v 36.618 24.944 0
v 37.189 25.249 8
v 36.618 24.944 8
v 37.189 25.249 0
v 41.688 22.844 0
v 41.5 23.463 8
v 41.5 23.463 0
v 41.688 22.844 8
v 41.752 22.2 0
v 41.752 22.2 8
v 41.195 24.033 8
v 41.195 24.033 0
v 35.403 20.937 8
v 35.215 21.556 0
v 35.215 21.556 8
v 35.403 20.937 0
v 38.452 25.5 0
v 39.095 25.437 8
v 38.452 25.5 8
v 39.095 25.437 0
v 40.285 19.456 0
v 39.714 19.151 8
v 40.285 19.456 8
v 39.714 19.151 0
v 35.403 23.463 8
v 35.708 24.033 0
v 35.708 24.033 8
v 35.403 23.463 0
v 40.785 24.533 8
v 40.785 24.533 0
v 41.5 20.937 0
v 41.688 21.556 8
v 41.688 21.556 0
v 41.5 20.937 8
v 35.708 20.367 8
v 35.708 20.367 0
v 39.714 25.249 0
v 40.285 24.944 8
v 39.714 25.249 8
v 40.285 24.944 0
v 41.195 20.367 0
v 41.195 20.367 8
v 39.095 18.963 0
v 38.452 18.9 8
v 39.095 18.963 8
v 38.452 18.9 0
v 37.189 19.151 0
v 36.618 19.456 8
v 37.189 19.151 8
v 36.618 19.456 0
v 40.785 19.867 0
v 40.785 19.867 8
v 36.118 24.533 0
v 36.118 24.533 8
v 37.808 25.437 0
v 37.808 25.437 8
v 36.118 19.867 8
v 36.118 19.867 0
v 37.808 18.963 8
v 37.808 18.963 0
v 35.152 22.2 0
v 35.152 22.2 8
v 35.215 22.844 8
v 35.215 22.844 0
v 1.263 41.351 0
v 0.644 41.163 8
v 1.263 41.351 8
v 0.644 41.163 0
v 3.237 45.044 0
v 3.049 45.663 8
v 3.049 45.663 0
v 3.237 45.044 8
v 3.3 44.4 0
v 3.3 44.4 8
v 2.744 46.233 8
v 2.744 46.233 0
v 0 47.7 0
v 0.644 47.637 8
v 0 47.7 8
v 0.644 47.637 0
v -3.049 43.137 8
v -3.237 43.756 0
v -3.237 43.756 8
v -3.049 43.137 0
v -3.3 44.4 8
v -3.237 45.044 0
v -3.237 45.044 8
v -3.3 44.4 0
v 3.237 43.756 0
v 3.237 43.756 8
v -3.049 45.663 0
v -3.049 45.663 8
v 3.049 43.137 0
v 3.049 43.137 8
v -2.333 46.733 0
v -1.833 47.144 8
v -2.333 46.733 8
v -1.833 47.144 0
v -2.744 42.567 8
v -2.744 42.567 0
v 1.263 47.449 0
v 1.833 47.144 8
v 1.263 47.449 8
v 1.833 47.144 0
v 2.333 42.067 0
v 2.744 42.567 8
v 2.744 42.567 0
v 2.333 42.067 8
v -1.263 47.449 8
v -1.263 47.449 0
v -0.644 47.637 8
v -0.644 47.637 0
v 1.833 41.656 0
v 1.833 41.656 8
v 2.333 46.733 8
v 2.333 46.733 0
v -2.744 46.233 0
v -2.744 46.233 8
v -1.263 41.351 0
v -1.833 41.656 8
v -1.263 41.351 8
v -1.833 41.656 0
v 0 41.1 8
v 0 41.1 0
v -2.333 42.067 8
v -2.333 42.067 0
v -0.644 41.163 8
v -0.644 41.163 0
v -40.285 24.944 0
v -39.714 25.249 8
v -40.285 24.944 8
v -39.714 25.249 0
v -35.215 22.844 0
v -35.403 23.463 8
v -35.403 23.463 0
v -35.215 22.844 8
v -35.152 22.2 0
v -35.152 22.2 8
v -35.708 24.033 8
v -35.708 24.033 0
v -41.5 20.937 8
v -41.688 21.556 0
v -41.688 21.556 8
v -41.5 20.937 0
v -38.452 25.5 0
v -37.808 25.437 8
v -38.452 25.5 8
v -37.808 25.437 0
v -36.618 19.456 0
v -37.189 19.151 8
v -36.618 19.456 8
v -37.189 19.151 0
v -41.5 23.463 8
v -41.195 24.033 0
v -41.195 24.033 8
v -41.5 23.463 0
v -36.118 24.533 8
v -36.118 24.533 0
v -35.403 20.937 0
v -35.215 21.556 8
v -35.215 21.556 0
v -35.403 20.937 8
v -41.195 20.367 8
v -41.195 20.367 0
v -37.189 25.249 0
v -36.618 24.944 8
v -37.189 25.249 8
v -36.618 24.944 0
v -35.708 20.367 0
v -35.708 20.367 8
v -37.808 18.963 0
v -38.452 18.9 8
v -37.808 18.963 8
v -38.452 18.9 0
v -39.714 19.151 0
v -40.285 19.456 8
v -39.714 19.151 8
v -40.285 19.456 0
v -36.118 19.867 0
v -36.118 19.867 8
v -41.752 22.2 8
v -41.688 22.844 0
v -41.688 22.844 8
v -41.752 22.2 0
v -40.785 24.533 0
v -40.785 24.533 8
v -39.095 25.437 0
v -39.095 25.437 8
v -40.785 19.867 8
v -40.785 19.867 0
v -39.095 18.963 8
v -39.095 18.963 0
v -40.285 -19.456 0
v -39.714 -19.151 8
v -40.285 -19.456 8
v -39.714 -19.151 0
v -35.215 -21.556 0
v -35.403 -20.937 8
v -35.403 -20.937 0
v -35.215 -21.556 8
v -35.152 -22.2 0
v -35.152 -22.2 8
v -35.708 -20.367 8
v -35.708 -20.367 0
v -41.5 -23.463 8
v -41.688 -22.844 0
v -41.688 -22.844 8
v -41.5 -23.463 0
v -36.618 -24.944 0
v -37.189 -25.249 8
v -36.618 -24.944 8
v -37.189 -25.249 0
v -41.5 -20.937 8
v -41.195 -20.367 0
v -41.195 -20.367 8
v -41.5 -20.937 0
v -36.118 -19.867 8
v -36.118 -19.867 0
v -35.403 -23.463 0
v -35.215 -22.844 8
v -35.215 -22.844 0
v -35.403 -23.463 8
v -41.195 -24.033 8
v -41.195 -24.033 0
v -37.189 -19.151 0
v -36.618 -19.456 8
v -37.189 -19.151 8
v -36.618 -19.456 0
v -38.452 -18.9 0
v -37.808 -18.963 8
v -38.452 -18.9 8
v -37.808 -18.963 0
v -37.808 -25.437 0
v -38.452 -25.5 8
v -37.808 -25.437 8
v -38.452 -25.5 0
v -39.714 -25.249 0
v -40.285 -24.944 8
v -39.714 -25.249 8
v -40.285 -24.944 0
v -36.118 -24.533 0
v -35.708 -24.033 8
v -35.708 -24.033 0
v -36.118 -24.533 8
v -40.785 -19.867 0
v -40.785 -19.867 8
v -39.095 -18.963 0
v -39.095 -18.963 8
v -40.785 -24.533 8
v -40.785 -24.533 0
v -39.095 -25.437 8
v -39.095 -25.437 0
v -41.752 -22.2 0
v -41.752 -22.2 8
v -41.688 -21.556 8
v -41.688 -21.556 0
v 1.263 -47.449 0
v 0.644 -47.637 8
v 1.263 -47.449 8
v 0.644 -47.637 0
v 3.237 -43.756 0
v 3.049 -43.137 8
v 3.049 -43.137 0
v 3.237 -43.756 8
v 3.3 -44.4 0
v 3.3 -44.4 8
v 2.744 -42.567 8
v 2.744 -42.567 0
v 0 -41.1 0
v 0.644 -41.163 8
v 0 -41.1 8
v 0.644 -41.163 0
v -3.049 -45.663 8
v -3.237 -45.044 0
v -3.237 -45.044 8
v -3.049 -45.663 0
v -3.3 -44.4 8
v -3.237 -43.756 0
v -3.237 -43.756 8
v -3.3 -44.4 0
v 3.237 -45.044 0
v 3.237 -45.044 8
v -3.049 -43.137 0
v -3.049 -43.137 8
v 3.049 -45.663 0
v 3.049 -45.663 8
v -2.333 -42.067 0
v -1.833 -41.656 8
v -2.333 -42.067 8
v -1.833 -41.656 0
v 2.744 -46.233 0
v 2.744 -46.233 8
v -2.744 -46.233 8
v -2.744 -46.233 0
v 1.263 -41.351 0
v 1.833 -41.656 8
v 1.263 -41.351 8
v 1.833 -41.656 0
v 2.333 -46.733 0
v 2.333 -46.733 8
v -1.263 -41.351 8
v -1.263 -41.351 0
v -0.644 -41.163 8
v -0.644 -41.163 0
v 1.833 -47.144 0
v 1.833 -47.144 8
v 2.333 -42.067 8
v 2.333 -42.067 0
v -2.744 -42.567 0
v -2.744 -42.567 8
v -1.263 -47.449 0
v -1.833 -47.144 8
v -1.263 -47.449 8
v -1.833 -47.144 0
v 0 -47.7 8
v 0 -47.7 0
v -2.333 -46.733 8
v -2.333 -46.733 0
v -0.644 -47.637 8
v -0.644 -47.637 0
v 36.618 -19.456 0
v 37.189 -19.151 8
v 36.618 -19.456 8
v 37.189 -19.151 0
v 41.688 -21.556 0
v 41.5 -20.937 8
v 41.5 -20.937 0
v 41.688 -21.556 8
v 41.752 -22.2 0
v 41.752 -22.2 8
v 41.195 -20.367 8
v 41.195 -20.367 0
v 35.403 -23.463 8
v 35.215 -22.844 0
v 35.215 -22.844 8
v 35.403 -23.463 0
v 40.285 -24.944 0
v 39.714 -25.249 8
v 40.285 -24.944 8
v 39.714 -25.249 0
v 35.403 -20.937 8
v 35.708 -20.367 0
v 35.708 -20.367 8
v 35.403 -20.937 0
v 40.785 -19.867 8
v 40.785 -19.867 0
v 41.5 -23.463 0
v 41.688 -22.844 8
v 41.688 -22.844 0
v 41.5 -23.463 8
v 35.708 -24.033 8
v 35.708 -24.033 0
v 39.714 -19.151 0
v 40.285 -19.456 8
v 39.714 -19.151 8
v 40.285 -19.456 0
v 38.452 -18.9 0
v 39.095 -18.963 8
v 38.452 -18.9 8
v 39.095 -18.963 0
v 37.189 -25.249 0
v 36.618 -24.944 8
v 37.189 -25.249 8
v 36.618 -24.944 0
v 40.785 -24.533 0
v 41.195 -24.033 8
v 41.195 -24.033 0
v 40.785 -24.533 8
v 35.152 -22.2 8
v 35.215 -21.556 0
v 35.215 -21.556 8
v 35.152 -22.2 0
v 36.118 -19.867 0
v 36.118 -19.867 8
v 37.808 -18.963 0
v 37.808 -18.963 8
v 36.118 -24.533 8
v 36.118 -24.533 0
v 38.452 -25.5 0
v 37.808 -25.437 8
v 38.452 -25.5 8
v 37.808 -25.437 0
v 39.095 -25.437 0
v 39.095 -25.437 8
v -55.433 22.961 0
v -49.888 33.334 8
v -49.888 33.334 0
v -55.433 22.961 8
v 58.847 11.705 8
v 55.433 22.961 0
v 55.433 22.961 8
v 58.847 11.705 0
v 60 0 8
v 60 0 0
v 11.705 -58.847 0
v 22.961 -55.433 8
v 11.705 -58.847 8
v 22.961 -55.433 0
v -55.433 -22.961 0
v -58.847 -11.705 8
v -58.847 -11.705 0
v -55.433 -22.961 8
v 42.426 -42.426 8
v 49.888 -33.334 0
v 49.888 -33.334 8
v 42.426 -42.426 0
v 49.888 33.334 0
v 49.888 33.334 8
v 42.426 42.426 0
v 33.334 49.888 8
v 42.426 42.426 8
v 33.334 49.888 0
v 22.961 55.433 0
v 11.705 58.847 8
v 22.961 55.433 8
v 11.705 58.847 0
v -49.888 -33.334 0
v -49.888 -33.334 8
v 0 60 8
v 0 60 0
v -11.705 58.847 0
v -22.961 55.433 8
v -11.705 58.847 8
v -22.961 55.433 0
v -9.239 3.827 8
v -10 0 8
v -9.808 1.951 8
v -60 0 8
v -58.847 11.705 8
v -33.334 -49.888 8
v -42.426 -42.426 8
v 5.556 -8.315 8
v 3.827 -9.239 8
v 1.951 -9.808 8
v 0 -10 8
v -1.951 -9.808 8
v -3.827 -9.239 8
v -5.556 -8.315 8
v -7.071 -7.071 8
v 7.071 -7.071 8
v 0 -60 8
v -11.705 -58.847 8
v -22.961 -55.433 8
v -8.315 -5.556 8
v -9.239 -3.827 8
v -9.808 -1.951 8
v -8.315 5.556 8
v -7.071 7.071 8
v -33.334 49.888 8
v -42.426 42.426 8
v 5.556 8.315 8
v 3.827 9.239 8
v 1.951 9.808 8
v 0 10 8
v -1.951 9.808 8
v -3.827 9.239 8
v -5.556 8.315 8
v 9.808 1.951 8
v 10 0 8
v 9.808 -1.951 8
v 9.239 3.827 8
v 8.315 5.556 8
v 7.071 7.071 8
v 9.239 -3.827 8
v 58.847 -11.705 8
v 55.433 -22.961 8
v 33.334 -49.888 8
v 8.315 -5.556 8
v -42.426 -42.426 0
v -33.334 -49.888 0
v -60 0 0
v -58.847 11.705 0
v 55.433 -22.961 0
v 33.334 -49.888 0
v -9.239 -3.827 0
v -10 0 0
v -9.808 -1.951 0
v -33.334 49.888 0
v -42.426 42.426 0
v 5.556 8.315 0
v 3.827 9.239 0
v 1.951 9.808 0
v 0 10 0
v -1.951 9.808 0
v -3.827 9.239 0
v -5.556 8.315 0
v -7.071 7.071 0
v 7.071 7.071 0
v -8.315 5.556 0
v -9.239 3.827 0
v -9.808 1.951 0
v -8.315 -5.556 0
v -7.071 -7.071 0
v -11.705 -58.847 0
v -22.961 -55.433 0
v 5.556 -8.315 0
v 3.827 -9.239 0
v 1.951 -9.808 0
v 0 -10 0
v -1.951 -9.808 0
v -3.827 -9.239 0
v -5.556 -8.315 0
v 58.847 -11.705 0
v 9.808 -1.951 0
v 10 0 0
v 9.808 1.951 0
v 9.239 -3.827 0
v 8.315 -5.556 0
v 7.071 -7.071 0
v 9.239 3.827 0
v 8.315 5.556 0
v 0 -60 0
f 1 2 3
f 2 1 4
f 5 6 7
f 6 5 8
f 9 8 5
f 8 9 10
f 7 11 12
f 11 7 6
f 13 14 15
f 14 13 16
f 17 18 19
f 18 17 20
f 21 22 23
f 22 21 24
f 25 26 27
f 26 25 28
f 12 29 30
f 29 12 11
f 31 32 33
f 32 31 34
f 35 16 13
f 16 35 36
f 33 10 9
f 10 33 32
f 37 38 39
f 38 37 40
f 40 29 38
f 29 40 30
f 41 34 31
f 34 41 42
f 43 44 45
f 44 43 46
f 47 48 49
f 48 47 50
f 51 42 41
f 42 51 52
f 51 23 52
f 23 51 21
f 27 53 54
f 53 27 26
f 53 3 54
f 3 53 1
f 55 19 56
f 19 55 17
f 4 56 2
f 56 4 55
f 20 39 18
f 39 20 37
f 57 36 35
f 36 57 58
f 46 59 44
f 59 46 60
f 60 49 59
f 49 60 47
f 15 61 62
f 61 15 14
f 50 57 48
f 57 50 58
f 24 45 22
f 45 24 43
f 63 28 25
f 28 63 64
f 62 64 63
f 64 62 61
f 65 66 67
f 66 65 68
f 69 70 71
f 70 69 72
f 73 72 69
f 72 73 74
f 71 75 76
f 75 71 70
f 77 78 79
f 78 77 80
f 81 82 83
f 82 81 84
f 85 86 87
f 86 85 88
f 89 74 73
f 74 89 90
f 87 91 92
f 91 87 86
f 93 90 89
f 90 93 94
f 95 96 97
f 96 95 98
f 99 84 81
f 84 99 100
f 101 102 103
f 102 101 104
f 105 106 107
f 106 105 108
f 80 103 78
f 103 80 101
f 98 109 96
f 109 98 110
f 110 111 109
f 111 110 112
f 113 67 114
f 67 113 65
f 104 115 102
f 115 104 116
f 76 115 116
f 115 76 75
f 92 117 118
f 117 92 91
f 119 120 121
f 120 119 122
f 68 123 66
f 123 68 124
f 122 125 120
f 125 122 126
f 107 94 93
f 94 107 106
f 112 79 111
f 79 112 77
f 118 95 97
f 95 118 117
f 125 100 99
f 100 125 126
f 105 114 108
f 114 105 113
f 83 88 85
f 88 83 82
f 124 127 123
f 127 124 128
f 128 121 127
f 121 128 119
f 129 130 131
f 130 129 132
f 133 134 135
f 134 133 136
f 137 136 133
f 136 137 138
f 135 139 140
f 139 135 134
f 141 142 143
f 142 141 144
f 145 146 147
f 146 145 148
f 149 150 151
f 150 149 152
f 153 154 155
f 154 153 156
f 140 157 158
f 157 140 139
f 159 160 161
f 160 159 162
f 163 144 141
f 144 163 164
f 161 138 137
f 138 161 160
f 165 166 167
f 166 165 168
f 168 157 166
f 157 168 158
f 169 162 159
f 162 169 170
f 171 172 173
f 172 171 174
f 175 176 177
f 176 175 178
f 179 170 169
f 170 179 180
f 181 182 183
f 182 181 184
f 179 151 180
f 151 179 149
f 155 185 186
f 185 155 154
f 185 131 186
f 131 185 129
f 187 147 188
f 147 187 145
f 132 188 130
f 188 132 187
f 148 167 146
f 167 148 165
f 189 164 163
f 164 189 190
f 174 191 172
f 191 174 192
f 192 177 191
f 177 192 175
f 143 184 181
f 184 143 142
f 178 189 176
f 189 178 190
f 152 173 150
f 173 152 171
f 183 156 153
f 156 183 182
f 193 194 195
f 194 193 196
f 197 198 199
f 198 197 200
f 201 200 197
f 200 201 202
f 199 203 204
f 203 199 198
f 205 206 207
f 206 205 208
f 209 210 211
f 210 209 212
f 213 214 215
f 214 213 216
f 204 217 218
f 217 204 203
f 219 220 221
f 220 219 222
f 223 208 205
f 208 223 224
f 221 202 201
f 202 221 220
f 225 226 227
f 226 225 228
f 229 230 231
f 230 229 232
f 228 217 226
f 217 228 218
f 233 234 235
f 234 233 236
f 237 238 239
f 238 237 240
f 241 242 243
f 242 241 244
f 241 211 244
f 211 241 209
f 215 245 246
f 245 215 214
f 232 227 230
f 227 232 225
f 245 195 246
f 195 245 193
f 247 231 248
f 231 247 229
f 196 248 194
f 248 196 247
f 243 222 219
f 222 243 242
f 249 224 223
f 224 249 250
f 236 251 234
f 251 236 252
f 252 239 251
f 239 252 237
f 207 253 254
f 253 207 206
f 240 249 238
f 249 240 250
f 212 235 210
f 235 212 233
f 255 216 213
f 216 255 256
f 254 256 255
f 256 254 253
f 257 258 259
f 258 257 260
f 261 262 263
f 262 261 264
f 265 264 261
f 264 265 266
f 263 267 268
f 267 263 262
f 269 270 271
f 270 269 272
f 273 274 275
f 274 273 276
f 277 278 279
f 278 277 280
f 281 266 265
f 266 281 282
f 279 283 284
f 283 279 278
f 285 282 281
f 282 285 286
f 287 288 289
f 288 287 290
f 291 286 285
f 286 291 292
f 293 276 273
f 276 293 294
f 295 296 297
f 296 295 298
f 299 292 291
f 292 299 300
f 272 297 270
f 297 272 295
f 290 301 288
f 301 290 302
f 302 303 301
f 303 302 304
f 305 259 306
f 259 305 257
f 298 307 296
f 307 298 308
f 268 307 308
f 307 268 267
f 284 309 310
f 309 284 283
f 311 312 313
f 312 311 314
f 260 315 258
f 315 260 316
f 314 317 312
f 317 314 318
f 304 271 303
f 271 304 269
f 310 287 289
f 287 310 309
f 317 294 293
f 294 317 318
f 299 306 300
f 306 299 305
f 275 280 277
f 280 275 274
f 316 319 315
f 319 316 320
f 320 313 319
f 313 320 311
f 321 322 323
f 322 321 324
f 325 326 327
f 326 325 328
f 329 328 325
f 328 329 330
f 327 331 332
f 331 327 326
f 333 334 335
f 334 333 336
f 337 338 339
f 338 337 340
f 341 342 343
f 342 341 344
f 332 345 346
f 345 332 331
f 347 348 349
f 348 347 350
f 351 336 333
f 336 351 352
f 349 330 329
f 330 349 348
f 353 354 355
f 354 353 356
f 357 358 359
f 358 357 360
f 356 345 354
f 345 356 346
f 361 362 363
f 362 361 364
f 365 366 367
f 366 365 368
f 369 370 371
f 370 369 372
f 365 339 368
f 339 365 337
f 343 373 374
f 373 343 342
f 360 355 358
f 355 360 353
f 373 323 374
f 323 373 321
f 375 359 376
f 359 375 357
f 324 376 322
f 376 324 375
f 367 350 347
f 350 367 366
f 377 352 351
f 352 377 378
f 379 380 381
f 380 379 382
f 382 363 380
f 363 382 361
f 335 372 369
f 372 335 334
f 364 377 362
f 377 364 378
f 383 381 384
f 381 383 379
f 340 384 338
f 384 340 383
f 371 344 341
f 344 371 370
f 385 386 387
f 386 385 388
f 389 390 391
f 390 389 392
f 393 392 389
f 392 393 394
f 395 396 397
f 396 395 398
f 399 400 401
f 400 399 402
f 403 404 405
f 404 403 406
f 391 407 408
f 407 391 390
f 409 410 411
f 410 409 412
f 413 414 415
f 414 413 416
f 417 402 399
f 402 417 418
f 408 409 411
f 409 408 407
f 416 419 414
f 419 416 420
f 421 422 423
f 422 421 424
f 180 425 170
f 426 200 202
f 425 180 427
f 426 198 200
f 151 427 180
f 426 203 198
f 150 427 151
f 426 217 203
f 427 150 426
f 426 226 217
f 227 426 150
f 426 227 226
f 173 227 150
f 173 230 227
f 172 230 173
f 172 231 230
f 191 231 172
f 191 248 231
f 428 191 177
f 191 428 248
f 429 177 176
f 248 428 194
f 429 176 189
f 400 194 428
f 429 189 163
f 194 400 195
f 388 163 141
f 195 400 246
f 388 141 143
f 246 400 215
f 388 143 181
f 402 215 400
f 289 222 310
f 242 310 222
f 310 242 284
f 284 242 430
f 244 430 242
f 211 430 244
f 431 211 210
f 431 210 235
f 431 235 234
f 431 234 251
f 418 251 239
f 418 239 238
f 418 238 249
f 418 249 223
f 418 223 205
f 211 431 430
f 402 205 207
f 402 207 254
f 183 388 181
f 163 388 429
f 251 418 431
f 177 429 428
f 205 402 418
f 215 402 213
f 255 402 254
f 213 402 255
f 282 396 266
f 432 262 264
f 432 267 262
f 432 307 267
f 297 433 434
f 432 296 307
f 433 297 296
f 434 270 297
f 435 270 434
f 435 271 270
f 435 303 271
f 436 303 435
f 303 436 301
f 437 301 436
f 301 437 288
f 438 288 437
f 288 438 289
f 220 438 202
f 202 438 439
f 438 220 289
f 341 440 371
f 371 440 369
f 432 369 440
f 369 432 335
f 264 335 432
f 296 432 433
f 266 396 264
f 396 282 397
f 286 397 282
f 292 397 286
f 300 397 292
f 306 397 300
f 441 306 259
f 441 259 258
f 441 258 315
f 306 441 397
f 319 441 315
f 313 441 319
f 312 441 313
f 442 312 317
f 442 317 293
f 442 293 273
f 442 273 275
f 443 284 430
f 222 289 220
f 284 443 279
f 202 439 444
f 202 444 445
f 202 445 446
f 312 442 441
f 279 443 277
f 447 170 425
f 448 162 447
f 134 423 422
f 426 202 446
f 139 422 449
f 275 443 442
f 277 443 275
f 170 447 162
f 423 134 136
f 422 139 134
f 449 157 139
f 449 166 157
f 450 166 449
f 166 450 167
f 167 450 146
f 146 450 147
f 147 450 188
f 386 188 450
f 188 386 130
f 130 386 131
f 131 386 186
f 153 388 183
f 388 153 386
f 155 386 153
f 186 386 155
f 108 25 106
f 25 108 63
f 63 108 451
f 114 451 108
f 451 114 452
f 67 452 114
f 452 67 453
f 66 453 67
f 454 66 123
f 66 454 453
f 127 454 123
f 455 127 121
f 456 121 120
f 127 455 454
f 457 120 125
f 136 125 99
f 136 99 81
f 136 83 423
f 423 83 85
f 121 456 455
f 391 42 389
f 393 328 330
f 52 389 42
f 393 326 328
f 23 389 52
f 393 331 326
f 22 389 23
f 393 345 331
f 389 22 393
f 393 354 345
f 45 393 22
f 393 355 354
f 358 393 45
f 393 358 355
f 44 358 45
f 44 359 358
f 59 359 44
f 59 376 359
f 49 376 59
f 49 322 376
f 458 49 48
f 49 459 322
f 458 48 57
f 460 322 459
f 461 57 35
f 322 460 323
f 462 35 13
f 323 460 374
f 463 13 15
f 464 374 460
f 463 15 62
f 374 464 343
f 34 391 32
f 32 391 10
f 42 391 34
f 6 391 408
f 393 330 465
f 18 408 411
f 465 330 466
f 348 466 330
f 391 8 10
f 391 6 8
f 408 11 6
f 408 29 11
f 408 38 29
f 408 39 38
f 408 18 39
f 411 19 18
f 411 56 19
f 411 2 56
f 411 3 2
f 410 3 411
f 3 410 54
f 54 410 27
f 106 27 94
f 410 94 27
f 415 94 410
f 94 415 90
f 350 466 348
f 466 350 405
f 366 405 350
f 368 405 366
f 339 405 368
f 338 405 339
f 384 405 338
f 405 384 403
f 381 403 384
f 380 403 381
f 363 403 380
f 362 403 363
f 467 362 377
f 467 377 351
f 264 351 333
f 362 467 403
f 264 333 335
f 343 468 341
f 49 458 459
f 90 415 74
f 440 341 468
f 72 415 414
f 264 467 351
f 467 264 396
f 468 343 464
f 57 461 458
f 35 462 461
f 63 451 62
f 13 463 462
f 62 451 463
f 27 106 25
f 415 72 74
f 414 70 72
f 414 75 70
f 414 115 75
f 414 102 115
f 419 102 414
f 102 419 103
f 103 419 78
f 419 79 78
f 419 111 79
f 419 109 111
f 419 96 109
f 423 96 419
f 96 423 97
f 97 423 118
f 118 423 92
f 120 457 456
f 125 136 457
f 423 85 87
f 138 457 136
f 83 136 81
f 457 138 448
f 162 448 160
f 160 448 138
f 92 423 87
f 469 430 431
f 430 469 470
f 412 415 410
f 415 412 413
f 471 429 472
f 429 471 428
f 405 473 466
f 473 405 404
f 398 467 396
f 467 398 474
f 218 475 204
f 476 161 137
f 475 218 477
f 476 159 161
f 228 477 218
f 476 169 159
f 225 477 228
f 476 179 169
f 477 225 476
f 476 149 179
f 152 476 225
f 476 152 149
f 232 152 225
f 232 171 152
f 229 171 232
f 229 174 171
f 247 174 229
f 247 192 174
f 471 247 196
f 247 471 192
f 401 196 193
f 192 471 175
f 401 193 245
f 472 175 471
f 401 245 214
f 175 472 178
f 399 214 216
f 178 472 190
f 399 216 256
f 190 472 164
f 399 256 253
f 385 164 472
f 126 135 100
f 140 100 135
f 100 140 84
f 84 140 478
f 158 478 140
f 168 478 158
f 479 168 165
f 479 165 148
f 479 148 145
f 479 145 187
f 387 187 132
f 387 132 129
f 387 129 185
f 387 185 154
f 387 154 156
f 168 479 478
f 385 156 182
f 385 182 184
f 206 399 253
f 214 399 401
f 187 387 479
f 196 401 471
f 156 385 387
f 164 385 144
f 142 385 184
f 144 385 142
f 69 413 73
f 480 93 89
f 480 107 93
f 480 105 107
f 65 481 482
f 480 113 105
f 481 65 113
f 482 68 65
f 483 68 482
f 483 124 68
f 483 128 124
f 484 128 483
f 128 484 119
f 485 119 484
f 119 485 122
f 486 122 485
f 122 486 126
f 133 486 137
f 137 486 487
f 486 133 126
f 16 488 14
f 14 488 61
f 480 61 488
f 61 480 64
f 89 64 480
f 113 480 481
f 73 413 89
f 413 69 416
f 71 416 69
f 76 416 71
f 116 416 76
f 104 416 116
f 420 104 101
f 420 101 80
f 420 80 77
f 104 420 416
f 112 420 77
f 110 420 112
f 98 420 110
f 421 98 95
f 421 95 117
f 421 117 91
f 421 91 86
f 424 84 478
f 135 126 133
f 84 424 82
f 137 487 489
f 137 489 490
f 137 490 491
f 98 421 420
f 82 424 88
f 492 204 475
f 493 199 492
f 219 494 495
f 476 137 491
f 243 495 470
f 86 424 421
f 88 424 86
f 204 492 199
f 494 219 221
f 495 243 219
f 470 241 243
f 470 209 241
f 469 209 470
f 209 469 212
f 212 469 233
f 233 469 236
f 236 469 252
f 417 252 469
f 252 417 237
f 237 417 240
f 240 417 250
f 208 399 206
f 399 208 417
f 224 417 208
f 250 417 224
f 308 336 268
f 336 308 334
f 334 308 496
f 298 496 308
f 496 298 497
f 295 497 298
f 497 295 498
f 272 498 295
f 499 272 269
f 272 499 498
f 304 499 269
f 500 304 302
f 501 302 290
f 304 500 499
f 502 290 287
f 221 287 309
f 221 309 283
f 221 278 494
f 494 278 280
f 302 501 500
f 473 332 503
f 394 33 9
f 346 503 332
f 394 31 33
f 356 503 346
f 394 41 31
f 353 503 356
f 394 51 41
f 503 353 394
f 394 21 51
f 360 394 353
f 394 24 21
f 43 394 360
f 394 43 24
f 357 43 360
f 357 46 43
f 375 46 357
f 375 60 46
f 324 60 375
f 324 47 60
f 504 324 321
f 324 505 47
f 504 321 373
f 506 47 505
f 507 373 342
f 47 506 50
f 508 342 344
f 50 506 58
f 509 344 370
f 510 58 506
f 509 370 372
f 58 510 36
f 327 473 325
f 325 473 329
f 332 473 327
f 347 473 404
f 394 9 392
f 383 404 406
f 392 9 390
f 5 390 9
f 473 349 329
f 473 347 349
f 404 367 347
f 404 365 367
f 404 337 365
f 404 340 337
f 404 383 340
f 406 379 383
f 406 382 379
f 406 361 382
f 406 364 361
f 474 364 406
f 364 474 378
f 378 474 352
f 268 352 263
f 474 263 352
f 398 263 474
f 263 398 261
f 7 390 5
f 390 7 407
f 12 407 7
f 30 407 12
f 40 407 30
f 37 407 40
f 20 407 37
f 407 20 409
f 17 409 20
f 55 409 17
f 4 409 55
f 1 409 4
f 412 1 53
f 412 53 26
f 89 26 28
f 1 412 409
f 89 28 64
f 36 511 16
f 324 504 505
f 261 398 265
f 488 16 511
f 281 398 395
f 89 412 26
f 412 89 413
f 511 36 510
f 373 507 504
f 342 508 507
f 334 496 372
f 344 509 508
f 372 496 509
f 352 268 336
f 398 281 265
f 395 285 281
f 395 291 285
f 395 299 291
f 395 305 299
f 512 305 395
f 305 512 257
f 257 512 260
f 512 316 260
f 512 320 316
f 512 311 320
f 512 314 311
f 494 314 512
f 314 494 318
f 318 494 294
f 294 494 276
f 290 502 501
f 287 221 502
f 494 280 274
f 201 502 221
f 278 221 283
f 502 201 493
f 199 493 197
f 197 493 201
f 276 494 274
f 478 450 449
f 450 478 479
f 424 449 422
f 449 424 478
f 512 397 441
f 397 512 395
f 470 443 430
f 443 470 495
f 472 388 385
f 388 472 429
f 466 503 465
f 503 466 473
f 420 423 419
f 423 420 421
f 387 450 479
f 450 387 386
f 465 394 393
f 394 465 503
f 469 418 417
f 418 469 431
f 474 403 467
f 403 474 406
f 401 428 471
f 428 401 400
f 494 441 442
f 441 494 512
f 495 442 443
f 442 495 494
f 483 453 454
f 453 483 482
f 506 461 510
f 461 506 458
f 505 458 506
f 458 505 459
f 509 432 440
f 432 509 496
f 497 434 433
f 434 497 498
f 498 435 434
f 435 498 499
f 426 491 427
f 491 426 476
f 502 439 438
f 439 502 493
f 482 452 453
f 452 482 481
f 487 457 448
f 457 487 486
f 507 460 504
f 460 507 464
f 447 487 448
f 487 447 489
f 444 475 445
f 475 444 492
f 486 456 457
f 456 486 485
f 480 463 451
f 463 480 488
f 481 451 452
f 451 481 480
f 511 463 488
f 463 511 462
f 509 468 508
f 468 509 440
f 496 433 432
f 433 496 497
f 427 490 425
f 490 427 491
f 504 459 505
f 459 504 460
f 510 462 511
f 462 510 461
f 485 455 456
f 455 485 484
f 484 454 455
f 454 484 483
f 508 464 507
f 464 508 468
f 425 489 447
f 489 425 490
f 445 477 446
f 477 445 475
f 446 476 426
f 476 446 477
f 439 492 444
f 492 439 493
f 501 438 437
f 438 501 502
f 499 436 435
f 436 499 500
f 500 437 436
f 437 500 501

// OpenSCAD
$fn = 32;

// ----------------------------------------------------------------------
// Flange Ø120 x 8
// 6 holes on a Ø88.8 bolt circle, bolted joints
// ----------------------------------------------------------------------

// --- parameters (mm) ---
flange_d = 120;  // outside diameter of the flange
thickness = 8;   // flange thickness
holes = 6;       // number of bolt holes
pcd = 88.8;      // bolt circle diameter
start_deg = 30;  // angle of the first hole, from +X
hole_d = 6.6;    // bolt hole diameter
bore_d = 20;     // central through bore
hub_d = 32;      // hub outside diameter
hub_h = 0;       // hub height above the flange face (0 = no hub)

// --- derived feature positions (mm) ---
height = thickness + hub_h;  // = 8   overall height of the part
pcd_r = pcd / 2;             // = 44.4   bolt circle radius
hole_step = 360 / holes;     // = 60   angular pitch
feature_centers = [
  [pcd_r * cos(start_deg + 0 * hole_step), pcd_r * sin(start_deg + 0 * hole_step)],
  [pcd_r * cos(start_deg + 1 * hole_step), pcd_r * sin(start_deg + 1 * hole_step)],
  [pcd_r * cos(start_deg + 2 * hole_step), pcd_r * sin(start_deg + 2 * hole_step)],
  [pcd_r * cos(start_deg + 3 * hole_step), pcd_r * sin(start_deg + 3 * hole_step)],
  [pcd_r * cos(start_deg + 4 * hole_step), pcd_r * sin(start_deg + 4 * hole_step)],
  [pcd_r * cos(start_deg + 5 * hole_step), pcd_r * sin(start_deg + 5 * hole_step)]
];   // bolt hole centres on the pitch circle

// flange disc, every hole and the bore cut straight through
difference() {
  union() {
    cylinder(d = flange_d, h = thickness);
  }
  translate([0, 0, -1]) cylinder(d = bore_d, h = height + 2);  // bore, through
  for (centre = feature_centers)
    translate([centre[0], centre[1], -1]) cylinder(d = hole_d, h = thickness + 2);
}
